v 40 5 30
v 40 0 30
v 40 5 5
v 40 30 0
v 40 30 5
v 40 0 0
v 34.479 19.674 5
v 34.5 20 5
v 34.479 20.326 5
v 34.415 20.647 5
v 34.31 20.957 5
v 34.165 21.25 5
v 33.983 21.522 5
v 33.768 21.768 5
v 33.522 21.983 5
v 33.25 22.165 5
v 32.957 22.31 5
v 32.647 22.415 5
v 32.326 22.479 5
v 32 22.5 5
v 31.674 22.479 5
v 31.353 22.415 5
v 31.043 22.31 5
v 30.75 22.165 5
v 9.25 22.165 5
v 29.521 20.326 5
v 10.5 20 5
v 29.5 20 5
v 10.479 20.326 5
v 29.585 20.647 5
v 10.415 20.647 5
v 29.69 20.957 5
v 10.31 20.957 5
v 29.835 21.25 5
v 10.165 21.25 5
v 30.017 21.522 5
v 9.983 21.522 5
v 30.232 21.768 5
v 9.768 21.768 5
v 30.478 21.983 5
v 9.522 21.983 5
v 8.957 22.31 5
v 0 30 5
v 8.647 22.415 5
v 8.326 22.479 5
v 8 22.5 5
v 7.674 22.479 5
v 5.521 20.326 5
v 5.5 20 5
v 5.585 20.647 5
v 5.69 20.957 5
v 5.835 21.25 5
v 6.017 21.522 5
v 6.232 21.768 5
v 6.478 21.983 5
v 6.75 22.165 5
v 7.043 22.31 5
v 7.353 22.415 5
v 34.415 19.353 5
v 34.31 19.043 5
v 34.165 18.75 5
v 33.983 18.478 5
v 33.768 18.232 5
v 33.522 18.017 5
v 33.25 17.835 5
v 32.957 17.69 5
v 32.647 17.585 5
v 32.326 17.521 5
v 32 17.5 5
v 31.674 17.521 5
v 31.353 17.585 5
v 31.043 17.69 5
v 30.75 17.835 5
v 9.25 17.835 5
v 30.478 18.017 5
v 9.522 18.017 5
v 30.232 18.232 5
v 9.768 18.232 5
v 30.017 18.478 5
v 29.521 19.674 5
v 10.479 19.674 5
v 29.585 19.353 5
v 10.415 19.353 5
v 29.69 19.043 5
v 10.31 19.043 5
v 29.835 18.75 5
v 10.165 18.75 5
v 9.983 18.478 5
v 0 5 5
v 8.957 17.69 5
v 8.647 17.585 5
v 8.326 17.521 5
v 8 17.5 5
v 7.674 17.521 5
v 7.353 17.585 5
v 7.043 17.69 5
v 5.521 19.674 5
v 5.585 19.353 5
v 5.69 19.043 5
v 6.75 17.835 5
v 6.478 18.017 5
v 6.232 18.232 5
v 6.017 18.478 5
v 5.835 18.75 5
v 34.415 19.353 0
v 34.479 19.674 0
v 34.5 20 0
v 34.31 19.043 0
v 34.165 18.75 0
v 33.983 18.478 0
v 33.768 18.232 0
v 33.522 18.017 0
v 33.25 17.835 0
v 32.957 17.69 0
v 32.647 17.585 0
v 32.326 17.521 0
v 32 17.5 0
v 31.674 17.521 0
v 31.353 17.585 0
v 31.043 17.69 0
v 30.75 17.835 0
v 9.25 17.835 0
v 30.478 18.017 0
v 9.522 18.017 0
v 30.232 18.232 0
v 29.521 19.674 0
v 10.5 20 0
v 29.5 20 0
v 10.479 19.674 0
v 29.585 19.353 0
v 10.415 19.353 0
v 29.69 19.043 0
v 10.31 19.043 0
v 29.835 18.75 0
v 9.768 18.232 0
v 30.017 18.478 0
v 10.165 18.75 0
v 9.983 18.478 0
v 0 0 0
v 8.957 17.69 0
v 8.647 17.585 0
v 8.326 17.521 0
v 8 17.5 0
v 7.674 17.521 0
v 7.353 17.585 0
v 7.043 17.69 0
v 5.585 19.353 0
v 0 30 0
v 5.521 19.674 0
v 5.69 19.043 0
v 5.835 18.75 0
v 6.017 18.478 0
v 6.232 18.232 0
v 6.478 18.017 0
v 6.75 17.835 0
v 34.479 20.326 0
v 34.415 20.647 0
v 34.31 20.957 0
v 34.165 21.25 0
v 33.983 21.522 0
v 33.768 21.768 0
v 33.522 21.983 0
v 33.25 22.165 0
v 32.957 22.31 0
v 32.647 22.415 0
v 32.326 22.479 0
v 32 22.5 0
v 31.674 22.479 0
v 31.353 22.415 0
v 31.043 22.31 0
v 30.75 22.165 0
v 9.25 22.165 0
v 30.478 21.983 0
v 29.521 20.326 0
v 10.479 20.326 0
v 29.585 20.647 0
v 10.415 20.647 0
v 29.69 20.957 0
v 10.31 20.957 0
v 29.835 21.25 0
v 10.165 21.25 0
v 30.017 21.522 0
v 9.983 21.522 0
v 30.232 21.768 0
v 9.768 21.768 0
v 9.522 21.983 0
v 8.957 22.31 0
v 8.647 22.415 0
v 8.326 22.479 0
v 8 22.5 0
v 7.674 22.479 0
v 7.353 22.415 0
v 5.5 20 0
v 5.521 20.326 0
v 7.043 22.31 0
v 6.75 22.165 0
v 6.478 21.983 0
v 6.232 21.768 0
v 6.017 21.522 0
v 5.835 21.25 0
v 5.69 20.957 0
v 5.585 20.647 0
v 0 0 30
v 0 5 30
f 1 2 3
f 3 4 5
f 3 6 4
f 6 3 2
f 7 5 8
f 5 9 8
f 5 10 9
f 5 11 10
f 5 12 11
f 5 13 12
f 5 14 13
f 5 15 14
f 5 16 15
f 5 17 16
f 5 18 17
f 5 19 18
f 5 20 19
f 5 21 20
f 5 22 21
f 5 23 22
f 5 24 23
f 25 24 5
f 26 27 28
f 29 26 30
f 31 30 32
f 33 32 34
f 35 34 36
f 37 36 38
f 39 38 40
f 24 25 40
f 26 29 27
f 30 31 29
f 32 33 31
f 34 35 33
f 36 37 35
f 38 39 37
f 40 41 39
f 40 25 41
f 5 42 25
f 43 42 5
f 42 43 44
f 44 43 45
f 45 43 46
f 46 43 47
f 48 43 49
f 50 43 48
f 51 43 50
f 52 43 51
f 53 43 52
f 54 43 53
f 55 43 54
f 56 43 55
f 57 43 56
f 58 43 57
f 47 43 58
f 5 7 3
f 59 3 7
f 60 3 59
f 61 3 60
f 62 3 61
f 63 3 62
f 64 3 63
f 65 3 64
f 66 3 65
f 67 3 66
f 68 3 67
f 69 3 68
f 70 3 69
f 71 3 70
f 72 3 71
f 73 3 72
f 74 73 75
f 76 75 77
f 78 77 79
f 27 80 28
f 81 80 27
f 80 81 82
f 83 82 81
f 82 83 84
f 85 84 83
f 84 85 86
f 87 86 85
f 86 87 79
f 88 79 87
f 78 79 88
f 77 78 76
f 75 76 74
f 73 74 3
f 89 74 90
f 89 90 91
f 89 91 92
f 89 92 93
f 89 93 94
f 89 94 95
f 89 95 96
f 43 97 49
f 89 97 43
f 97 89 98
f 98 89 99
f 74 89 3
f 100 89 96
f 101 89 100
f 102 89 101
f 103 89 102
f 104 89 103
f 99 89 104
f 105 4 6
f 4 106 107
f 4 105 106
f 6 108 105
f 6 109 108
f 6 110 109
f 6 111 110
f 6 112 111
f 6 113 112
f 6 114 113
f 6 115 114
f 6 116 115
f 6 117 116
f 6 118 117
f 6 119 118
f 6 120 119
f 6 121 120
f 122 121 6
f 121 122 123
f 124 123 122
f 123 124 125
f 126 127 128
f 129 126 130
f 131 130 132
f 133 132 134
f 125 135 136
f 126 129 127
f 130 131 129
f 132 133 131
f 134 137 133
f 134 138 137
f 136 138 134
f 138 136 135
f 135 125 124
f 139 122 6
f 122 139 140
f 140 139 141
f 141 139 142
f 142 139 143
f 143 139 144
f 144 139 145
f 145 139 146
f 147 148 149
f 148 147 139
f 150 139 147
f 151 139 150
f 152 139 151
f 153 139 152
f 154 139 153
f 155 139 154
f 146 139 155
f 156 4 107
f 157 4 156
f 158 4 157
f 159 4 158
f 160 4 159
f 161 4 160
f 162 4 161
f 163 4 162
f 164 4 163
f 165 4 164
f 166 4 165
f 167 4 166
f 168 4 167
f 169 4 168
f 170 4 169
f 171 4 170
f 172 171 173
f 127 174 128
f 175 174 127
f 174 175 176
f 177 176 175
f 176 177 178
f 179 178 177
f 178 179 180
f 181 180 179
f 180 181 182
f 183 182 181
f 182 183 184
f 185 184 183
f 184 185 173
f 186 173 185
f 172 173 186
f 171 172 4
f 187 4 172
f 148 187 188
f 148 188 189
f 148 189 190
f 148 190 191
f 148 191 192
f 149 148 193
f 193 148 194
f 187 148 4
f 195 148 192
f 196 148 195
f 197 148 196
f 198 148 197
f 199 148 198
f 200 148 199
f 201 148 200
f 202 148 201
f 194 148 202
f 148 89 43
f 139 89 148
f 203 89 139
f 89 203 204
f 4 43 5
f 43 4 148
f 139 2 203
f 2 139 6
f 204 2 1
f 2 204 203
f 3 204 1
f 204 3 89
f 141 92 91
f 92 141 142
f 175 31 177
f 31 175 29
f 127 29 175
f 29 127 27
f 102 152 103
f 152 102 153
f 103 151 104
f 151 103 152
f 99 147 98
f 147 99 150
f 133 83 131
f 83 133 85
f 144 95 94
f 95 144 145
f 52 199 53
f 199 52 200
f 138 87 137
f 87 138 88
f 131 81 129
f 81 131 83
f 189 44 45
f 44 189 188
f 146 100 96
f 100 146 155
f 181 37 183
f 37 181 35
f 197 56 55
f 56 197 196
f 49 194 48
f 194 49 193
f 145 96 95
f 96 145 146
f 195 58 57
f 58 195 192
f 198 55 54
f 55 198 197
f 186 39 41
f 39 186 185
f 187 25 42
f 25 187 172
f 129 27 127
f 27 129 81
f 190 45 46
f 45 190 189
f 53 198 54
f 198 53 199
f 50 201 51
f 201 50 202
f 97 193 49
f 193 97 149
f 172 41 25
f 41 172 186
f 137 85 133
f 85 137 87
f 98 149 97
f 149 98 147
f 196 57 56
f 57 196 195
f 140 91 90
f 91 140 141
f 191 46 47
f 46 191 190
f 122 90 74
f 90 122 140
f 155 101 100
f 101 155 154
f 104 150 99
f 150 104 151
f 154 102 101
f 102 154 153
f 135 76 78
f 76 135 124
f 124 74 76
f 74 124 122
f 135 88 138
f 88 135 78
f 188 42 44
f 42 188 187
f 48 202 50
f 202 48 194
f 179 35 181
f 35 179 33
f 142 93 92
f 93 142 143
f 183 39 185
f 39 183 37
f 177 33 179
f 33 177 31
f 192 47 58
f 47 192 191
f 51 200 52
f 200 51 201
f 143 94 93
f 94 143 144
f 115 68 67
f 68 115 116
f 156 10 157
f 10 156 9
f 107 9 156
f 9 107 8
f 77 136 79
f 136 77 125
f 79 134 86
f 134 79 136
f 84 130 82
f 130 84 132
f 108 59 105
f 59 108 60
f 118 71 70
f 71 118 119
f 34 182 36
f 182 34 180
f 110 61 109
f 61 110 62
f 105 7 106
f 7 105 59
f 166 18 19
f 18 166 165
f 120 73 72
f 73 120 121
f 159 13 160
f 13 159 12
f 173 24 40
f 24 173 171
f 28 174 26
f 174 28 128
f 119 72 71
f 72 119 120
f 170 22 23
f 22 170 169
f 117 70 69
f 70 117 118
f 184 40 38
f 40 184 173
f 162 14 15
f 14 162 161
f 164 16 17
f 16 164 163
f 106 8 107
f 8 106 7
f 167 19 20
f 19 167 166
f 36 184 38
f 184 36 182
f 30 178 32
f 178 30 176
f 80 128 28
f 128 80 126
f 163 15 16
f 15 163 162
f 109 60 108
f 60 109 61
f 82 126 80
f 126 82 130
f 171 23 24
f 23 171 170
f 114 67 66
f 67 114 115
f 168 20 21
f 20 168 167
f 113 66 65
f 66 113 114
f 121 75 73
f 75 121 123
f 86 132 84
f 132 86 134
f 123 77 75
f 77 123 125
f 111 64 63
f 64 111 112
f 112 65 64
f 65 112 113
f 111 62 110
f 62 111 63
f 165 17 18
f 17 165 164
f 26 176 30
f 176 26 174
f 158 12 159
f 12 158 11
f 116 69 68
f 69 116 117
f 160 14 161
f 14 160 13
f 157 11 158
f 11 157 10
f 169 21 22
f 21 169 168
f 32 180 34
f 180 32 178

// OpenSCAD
$fn=48;
difference(){
  union(){
    cube([40,30,5]);        // base
    cube([40,5,30]);        // upright at Y=0 edge, 30 tall overall
  }
  for(x=[8,32]) translate([x,20,-1]) cylinder(d=5,h=7);
}
